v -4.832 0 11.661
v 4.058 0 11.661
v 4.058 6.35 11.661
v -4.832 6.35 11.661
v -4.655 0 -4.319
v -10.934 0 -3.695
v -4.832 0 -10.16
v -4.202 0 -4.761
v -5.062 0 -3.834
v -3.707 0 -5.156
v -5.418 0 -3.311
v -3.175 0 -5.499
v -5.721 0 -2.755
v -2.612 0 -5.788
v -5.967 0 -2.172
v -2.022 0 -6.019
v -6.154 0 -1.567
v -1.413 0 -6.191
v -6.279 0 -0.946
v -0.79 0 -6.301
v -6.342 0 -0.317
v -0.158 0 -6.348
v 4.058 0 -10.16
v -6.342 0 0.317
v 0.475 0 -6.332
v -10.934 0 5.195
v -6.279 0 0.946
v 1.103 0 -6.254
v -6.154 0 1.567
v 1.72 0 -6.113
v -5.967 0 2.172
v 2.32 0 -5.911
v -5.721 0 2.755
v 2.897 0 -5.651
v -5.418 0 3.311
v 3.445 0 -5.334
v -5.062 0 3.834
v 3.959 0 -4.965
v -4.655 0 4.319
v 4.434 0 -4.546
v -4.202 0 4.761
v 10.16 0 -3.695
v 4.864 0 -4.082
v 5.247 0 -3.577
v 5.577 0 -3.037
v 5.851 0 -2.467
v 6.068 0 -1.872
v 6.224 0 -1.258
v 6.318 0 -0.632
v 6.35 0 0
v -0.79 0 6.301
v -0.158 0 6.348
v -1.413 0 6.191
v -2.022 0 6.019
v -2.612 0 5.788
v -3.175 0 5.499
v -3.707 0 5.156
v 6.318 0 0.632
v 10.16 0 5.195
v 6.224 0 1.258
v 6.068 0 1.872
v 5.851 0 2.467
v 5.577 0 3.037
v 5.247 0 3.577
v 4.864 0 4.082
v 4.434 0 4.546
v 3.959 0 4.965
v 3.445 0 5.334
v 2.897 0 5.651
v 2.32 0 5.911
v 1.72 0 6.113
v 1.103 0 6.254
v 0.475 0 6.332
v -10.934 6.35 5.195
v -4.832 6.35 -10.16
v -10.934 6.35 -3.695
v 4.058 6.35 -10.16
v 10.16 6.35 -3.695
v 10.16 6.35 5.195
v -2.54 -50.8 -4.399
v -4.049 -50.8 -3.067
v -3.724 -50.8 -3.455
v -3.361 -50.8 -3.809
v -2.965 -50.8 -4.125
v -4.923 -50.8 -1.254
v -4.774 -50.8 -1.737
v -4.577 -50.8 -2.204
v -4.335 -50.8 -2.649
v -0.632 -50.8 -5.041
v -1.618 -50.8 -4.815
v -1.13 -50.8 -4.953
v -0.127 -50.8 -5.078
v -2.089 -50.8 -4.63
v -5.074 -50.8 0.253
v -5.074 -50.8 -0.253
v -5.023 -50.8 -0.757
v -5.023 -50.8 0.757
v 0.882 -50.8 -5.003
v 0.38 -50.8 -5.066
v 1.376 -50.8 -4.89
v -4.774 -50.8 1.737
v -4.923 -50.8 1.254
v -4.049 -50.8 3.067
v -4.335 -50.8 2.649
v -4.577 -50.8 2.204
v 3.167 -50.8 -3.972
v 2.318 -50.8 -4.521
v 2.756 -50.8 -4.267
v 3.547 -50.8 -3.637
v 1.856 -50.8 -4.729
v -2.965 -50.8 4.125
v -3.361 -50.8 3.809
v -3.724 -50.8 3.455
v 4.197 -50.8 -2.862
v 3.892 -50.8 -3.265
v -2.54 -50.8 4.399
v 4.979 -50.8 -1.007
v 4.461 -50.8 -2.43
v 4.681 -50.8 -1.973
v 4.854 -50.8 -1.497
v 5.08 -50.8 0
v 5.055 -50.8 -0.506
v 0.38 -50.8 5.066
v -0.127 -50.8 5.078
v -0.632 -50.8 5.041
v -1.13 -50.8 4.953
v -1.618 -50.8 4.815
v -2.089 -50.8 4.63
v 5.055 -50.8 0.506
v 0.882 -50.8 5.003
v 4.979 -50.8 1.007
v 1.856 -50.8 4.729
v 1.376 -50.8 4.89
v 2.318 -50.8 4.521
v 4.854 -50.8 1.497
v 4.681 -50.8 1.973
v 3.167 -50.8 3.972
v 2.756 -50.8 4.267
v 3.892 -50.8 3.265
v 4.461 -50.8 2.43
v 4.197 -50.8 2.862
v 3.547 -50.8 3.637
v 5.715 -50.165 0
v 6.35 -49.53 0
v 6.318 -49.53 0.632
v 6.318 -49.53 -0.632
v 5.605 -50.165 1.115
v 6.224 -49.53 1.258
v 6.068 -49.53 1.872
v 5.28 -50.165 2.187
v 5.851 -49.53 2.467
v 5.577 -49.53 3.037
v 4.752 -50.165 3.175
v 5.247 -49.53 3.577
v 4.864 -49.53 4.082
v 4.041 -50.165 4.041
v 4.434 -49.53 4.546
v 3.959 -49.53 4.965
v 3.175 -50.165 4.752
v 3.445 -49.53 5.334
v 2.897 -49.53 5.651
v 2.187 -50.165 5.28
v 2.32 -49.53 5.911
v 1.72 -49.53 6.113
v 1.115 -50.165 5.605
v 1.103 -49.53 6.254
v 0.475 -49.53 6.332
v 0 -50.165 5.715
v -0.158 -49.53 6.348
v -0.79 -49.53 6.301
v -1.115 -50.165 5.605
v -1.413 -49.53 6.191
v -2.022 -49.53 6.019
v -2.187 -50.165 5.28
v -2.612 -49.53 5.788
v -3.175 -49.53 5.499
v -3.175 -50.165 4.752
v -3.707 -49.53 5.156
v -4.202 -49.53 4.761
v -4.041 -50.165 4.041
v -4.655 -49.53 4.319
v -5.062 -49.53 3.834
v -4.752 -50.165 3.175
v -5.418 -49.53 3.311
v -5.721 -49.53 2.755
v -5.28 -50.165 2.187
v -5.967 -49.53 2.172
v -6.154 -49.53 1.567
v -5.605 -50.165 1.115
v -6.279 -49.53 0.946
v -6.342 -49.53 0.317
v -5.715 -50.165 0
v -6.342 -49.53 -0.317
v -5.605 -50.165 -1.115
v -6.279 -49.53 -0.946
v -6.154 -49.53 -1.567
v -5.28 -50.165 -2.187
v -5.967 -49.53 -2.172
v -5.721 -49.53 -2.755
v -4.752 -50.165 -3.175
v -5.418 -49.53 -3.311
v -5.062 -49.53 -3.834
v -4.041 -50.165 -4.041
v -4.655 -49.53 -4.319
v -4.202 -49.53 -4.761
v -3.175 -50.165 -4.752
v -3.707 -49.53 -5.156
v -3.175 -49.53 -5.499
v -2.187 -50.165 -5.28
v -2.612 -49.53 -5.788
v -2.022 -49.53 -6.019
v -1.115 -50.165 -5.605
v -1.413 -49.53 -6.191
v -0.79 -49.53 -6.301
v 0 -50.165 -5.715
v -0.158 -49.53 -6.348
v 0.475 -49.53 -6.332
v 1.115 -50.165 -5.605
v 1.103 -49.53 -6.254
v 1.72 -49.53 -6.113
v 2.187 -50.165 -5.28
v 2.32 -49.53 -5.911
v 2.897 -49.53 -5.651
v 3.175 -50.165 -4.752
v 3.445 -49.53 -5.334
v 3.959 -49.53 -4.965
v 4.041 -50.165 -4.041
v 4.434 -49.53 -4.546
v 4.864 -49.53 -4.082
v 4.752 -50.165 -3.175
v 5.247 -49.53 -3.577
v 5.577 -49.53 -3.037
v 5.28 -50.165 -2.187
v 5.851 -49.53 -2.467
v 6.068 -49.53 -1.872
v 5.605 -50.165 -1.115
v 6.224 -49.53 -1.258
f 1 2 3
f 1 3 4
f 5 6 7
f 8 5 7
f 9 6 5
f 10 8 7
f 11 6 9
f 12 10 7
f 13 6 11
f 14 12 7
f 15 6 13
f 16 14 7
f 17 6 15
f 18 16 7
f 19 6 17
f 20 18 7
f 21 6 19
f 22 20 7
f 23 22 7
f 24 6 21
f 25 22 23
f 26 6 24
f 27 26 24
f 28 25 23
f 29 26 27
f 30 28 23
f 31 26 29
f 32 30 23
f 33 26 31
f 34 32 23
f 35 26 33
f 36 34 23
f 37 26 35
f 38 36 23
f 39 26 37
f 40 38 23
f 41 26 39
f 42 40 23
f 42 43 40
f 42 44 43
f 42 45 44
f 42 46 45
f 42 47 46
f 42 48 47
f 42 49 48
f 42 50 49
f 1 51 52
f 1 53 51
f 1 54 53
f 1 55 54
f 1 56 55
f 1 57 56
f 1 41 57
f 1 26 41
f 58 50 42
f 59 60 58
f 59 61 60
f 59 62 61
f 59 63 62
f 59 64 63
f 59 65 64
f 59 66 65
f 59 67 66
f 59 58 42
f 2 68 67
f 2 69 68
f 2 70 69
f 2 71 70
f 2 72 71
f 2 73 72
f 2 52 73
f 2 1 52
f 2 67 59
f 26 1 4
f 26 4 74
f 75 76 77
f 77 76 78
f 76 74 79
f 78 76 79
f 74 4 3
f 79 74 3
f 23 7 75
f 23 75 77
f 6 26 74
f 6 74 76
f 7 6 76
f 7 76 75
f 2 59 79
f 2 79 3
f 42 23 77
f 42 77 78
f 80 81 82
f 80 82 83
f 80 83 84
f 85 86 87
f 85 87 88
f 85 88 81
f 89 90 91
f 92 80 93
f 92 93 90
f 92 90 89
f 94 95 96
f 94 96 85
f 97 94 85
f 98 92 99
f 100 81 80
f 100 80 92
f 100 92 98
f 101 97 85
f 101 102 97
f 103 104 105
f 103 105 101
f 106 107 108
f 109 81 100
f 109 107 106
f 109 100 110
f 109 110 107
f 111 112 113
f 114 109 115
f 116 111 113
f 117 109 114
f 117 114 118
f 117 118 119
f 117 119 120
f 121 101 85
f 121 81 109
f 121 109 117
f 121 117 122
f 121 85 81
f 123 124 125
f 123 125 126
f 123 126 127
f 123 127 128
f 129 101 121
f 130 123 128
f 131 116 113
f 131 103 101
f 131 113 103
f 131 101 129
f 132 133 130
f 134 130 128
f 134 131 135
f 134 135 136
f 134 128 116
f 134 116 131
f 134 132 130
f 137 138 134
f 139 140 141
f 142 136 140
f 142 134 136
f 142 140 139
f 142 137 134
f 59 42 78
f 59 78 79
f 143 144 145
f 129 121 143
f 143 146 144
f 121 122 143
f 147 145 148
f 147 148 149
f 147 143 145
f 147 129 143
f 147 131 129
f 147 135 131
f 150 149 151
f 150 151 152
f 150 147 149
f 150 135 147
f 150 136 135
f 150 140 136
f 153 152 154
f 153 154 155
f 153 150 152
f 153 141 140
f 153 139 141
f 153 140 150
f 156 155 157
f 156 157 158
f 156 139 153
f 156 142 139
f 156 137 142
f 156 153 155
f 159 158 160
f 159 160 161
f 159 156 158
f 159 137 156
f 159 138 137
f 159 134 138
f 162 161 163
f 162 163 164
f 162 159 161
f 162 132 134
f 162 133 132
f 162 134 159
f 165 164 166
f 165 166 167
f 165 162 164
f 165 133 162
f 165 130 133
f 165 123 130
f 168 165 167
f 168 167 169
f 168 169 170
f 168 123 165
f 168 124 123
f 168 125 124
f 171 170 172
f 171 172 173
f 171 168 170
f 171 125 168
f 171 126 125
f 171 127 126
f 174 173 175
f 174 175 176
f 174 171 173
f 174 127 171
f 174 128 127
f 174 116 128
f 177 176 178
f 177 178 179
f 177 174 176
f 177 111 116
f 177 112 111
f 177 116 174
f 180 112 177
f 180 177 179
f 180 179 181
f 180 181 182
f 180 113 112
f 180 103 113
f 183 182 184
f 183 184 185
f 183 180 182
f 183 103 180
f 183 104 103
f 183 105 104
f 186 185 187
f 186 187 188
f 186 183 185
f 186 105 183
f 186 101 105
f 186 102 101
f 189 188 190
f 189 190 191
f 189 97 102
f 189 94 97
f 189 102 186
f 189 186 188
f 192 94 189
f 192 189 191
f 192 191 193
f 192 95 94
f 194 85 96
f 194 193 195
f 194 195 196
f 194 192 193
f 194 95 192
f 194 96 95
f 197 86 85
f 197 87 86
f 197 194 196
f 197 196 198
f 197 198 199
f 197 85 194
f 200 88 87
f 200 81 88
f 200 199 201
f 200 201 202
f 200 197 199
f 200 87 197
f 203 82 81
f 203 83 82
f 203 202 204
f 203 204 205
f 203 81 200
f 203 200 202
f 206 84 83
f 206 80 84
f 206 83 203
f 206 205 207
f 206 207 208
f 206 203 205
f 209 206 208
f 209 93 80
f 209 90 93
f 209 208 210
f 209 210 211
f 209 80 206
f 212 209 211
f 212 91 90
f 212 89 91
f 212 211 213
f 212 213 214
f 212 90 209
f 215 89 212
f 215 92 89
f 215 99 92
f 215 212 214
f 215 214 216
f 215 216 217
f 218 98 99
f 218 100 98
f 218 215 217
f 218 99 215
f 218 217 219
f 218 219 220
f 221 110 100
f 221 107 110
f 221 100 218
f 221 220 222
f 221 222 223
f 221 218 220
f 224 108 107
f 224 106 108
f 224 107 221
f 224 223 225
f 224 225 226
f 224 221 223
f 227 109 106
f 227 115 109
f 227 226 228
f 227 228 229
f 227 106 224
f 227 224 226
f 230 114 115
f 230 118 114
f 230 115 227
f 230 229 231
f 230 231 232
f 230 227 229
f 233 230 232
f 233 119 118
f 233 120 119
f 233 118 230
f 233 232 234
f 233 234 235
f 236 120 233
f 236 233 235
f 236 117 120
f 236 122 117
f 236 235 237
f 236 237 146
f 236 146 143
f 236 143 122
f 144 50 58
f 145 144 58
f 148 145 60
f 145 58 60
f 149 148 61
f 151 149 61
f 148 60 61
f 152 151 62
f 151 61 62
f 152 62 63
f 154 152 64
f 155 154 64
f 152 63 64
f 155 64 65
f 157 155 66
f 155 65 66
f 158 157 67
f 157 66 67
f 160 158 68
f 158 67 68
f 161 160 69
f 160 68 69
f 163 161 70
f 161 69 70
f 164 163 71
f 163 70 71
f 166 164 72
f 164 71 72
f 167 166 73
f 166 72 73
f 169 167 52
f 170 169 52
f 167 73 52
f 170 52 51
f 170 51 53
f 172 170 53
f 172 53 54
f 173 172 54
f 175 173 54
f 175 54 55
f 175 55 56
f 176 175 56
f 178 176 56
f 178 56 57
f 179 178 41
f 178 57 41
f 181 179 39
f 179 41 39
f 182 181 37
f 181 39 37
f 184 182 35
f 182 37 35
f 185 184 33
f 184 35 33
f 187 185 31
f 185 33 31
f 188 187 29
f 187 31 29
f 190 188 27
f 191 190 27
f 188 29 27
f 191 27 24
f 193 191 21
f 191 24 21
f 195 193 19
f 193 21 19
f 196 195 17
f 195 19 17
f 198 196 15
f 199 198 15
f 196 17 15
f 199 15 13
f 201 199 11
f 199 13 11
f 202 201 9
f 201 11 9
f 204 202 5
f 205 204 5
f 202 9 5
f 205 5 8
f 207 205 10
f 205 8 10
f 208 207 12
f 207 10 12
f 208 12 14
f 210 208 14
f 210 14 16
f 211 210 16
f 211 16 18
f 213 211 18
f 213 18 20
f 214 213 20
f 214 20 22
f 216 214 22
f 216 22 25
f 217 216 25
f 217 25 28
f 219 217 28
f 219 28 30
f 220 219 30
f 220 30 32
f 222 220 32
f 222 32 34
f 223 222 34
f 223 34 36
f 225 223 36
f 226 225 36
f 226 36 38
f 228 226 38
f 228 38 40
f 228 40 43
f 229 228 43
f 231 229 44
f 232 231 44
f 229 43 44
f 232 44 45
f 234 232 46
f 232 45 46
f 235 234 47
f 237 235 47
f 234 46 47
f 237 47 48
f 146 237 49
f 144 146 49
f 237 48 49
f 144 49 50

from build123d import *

# Parameters (mm, degrees)
F0_R     = 6.35
F1_DEPTH = 50.8
F3_DEPTH = 6.35
F4_SIZE  = 1.27


with BuildPart() as f1:
    # F0 (on Front) → F1 (new body)
    with BuildSketch(Plane.XZ):
        Circle(F0_R)
    extrude(amount=F1_DEPTH)

    # F2 (on Front) → F3 (join)
    with BuildSketch(Plane.XZ):
        Polygon((-10.933553, -3.694675), (-4.831777, -10.16), (4.058223, -10.16), (10.16, -3.694675), (10.16, 5.195325), (4.058223, 11.660649), (-4.831777, 11.660649), (-10.933553, 5.195325), align=None)
    extrude(amount=-F3_DEPTH)

    # F4
    f4_edges = [f1.edges().sort_by_distance(p)[0] for p in [
        (-6.35, -50.8, 0),
    ]]
    chamfer(f4_edges, length=F4_SIZE)


solid = f1.part
